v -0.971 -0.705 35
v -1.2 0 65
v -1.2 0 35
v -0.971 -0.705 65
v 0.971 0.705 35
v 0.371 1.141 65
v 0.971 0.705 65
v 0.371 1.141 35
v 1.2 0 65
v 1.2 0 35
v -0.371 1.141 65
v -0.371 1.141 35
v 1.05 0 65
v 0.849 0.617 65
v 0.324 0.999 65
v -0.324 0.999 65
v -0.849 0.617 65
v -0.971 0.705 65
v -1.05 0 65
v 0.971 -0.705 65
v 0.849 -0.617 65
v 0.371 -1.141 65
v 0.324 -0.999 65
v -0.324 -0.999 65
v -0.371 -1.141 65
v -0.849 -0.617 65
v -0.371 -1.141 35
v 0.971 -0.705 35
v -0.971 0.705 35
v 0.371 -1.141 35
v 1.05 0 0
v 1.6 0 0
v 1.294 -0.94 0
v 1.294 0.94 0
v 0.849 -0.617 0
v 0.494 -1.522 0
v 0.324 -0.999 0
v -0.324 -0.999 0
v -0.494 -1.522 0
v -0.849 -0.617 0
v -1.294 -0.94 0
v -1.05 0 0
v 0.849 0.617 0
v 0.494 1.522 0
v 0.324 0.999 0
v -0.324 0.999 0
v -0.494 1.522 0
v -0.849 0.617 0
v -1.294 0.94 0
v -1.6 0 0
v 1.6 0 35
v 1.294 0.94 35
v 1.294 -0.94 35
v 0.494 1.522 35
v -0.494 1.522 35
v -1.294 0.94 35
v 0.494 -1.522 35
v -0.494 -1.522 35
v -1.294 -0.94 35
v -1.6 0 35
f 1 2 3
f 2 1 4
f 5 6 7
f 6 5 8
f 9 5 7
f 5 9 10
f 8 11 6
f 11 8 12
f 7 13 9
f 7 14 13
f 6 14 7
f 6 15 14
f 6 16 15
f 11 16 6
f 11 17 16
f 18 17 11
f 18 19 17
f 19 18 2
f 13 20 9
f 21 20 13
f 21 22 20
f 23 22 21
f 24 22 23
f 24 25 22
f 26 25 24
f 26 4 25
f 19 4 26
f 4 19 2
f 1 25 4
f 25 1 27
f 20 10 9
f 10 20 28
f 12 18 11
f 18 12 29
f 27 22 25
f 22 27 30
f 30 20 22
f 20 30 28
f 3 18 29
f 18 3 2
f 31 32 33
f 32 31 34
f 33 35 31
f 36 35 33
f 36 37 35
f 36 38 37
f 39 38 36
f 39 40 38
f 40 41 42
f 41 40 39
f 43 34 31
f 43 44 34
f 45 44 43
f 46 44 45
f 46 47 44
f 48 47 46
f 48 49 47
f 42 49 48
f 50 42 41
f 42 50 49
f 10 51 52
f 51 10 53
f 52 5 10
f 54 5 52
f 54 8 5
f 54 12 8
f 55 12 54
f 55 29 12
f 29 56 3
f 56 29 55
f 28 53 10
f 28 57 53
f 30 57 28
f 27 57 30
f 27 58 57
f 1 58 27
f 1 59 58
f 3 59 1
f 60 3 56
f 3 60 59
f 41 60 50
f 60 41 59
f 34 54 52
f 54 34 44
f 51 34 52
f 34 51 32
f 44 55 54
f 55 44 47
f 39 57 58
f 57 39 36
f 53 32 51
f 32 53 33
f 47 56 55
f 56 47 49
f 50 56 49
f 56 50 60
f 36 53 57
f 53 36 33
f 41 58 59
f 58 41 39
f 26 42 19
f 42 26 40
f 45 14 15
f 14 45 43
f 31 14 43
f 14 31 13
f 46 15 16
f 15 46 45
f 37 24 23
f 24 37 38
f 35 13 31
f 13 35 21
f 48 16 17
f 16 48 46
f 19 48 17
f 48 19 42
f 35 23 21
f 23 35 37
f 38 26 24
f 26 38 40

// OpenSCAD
difference(){
union(){
translate([0,0,0])
scale([1,1,65])
	cylinder(r=1.2, $fn=10);

translate([0,0,0])
scale([1,1,35])
	cylinder(r=1.6, $fn=10);

}
translate (0,0,-0.1)
scale([1,1,66])
	cylinder(r=1.05, $fn=10);
}
